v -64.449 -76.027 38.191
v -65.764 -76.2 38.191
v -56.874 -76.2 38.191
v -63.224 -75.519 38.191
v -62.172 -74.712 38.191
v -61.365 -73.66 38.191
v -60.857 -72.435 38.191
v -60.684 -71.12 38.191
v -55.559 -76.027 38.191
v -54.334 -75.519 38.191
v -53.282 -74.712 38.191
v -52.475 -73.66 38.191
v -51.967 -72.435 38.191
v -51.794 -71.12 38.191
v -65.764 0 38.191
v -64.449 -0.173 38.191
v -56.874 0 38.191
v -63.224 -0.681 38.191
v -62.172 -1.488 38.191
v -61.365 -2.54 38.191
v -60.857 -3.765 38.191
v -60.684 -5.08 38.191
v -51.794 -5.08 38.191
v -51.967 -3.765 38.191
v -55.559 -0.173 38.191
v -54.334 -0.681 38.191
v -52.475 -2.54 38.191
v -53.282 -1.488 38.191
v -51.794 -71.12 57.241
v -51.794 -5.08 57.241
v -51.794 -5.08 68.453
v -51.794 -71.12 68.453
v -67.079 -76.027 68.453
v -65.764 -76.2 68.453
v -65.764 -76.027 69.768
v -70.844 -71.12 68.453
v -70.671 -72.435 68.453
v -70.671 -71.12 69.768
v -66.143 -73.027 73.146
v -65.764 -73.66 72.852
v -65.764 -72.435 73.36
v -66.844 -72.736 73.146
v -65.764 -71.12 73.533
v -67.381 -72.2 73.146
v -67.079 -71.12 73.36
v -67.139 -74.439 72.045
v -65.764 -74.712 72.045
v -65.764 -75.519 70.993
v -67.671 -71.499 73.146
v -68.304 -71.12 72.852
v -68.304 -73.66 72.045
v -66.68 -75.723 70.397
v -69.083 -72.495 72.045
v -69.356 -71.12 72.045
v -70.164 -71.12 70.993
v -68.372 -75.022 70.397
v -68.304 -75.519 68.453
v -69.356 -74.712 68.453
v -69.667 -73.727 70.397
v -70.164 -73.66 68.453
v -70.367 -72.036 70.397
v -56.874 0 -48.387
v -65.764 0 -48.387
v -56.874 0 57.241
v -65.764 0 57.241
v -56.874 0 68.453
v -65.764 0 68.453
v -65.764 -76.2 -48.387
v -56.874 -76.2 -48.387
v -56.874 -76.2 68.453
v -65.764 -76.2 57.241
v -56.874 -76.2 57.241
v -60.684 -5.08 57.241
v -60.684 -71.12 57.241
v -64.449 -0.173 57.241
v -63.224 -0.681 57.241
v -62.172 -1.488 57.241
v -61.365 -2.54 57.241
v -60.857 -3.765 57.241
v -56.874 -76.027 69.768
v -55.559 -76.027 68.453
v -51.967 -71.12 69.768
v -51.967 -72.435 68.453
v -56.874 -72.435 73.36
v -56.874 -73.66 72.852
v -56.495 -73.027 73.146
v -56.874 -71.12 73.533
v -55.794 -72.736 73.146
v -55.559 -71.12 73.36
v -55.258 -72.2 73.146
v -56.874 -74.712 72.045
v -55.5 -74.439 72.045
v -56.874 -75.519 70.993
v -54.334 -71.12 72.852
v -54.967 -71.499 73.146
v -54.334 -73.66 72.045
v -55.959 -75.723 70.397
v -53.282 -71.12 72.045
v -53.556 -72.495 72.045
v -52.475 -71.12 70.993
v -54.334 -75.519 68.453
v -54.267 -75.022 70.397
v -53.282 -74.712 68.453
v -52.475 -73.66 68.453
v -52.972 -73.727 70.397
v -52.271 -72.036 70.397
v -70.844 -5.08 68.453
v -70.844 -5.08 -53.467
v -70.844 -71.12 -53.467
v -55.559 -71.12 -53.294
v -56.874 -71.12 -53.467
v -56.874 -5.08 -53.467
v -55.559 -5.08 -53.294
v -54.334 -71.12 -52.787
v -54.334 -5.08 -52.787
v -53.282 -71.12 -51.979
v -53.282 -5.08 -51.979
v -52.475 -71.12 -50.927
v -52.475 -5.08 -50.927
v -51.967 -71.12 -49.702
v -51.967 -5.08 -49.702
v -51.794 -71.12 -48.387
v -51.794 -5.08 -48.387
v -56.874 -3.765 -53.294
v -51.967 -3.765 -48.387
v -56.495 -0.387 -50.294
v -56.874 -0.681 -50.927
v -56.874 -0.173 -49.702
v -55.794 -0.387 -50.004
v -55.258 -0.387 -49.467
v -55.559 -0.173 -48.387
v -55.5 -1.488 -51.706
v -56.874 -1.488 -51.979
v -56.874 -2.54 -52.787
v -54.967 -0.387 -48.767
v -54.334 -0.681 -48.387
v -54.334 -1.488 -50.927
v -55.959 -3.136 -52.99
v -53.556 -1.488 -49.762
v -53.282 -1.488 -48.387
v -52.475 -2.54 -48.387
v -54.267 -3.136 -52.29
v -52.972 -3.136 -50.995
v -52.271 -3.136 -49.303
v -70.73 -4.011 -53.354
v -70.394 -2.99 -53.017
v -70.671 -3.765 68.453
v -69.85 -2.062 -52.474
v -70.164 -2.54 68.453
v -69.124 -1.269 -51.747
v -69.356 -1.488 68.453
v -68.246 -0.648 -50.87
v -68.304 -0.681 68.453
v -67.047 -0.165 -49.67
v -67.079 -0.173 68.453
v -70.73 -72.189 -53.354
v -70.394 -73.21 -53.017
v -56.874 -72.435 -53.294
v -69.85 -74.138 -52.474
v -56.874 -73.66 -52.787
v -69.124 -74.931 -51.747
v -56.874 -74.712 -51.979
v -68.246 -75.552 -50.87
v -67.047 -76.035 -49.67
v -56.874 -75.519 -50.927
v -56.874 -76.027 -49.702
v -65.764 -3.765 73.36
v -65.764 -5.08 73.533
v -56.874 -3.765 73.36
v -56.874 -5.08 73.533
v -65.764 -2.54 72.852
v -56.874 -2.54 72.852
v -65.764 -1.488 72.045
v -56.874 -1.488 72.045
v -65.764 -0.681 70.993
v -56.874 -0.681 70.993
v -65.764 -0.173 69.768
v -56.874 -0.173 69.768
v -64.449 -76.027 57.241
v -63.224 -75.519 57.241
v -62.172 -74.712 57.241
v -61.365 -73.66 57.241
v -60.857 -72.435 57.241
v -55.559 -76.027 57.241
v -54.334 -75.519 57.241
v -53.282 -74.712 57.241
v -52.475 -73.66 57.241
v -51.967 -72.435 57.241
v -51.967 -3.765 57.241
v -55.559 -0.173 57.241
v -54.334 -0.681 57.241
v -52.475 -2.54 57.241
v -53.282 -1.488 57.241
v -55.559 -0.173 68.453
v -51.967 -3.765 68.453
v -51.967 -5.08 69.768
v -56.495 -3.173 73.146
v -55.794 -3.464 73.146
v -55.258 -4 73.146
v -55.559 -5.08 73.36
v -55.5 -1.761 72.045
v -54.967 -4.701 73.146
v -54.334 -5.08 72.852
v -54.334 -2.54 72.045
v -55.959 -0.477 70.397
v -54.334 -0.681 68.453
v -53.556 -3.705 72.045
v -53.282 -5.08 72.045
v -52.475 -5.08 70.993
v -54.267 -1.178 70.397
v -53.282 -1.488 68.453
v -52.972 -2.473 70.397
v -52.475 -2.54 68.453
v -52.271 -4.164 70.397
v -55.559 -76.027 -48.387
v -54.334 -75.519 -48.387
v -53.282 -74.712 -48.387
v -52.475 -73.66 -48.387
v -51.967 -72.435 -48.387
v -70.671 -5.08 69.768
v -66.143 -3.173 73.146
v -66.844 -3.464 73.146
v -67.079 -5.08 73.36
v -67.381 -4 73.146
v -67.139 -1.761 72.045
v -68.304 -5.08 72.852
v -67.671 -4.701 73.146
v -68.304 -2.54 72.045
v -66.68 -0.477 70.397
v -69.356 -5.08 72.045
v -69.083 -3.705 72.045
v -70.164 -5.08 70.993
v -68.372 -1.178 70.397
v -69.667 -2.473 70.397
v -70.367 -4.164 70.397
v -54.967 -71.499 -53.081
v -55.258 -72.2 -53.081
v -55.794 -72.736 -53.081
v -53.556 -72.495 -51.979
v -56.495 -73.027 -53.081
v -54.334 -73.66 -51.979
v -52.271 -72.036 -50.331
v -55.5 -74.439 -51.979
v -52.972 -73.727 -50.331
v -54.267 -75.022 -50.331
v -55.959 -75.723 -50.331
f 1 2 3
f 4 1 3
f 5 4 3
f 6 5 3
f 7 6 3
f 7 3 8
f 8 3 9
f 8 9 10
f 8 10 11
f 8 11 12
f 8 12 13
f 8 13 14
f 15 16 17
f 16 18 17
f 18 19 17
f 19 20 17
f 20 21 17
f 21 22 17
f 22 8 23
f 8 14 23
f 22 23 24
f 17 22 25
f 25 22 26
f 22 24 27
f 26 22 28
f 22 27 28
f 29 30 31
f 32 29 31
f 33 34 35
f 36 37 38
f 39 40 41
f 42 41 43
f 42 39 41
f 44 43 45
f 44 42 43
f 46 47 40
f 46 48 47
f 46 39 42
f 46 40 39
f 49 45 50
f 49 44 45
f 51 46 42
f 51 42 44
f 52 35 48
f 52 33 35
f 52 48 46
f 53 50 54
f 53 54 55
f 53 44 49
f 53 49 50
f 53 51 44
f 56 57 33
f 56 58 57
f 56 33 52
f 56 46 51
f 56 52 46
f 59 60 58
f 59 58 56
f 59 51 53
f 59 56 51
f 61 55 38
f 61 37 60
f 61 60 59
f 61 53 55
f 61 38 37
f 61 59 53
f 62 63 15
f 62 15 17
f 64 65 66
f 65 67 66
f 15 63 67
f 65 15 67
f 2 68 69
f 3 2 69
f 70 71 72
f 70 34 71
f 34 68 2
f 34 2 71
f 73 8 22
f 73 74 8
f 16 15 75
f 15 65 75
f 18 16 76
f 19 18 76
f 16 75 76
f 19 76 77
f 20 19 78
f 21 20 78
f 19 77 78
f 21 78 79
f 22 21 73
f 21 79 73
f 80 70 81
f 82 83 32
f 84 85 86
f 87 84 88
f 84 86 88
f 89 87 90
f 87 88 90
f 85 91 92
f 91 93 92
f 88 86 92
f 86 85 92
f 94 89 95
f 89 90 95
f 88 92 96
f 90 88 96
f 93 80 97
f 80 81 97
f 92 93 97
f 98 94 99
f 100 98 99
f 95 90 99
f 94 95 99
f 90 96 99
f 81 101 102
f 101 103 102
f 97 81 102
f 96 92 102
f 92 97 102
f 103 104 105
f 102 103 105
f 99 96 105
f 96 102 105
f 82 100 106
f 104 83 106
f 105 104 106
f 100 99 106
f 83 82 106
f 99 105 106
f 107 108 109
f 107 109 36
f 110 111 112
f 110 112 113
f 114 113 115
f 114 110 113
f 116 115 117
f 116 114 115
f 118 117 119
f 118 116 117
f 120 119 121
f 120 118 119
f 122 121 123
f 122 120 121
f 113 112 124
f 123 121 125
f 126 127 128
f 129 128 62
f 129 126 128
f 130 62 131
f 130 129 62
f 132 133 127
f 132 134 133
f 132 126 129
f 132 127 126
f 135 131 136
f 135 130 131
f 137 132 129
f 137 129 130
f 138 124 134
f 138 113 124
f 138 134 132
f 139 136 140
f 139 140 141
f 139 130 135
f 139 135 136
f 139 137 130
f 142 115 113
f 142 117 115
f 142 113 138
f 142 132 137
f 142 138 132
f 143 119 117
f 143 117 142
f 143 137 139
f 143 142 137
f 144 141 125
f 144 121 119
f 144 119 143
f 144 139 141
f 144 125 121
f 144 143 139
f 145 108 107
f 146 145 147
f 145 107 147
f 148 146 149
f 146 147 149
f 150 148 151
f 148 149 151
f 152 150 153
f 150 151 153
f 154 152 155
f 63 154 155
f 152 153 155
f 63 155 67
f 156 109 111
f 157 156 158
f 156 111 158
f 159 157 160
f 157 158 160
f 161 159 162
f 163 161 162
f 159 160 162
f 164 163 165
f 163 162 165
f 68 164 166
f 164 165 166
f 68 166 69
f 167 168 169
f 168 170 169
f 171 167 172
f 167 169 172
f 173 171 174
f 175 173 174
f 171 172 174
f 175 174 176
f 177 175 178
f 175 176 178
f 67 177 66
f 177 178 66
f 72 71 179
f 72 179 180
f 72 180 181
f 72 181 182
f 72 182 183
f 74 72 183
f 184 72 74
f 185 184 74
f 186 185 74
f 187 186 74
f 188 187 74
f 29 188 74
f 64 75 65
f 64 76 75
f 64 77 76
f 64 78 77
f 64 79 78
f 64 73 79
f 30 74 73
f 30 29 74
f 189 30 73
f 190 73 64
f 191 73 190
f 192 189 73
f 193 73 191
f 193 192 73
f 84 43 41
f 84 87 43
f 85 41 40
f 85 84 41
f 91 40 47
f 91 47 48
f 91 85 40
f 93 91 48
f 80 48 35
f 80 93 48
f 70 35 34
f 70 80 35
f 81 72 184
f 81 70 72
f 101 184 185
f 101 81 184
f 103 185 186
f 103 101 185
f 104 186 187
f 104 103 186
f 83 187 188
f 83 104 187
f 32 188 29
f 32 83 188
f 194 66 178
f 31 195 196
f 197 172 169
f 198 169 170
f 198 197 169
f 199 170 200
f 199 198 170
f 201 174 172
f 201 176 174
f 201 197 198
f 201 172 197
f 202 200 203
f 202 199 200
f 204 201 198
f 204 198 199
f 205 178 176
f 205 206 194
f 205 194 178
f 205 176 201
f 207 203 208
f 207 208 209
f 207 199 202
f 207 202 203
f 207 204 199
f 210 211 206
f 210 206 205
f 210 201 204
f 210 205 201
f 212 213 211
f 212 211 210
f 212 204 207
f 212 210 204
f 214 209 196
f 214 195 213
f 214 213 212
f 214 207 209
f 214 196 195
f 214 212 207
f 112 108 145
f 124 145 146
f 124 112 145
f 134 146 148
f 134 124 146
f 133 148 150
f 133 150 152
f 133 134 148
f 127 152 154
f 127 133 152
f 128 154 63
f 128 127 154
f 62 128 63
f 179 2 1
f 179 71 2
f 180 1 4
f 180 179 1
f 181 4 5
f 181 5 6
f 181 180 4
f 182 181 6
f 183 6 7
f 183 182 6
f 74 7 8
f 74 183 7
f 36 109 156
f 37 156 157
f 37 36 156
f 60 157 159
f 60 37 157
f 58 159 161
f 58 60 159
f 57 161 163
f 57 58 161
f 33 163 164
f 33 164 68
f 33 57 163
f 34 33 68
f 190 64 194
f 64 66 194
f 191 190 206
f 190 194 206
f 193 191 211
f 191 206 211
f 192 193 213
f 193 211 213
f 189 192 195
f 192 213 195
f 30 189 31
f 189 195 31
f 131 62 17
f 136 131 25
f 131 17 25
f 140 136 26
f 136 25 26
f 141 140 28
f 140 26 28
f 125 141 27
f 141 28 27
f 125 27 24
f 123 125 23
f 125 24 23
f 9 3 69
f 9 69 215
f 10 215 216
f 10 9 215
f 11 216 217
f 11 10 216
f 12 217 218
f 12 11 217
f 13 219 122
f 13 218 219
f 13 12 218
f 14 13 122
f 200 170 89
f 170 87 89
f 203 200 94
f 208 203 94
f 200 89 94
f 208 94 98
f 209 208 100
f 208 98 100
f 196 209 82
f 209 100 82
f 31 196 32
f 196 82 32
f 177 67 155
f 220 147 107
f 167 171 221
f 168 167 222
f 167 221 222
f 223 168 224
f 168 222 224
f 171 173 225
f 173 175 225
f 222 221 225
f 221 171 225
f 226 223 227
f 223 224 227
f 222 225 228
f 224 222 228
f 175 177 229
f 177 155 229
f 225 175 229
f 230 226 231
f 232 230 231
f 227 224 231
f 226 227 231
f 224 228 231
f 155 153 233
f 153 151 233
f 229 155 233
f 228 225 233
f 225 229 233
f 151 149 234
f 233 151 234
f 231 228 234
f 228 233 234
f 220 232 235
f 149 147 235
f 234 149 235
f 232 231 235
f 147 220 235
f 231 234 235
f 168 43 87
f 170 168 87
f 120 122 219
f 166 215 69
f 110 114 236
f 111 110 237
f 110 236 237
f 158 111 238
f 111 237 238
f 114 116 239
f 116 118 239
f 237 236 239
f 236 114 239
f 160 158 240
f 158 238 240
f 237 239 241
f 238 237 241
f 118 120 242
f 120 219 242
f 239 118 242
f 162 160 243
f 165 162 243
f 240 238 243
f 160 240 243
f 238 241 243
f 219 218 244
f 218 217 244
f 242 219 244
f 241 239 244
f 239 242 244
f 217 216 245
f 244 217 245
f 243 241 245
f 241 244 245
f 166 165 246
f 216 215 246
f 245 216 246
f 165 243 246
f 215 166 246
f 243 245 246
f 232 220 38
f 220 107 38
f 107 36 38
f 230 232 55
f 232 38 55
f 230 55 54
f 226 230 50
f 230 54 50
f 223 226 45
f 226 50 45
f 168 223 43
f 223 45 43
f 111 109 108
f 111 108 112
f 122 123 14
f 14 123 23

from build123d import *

# Parameters (mm, degrees)
F0_W     = 19.05
F0_H     = 127
F1_DEPTH = 76.2
F2_W     = 76.2
F2_H     = 19.05
F3_DEPTH = 8.89
F4_R     = 5.07999


# Not quite as in the source:
# - a fillet or chamfer is up to 0.001 mm smaller than in the source, because OpenCascade refuses the exact size


with BuildPart() as f1:
    # F0 (on Front) → F1 (new body)
    with BuildSketch(Plane.XZ):
        with Locations((-61.3191734314, 10.0326964855)):
            Rectangle(F0_W, F0_H)
    extrude(amount=F1_DEPTH)

    # F2 (on face) → F3 (cut)
    with BuildSketch(Plane.YZ.offset(-51.7941734314)):
        with Locations((-38.1, 47.7159310818)):
            Rectangle(F2_W, F2_H)
    extrude(amount=-F3_DEPTH, mode=Mode.SUBTRACT)

    # F4 (radius 5.08 in the source; OpenCascade refuses exactly that, so slightly less here)
    f4_edges = [f1.edges().sort_by_distance(p)[0] for p in [
        (-70.844173, -76.2, 10.032696),
        (-51.794173, -76.2, 65.386814),
        (-61.319173, -76.2, 73.532696),
        (-60.684173, -76.2, 47.715931),
        (-60.684173, 0, 47.715931),
        (-51.794173, -76.2, -7.638186),
        (-51.794173, -38.1, -53.467304),
        (-61.319173, -76.2, -53.467304),
        (-61.319173, 0, -53.467304),
        (-51.794173, 0, -7.638186),
        (-70.844173, 0, 10.032696),
        (-51.794173, 0, 65.386814),
        (-61.319173, 0, 73.532696),
        (-51.794173, -38.1, 73.532696),
        (-70.844173, -38.1, 73.532696),
    ]]
    fillet(f4_edges, radius=F4_R)


solid = f1.part
